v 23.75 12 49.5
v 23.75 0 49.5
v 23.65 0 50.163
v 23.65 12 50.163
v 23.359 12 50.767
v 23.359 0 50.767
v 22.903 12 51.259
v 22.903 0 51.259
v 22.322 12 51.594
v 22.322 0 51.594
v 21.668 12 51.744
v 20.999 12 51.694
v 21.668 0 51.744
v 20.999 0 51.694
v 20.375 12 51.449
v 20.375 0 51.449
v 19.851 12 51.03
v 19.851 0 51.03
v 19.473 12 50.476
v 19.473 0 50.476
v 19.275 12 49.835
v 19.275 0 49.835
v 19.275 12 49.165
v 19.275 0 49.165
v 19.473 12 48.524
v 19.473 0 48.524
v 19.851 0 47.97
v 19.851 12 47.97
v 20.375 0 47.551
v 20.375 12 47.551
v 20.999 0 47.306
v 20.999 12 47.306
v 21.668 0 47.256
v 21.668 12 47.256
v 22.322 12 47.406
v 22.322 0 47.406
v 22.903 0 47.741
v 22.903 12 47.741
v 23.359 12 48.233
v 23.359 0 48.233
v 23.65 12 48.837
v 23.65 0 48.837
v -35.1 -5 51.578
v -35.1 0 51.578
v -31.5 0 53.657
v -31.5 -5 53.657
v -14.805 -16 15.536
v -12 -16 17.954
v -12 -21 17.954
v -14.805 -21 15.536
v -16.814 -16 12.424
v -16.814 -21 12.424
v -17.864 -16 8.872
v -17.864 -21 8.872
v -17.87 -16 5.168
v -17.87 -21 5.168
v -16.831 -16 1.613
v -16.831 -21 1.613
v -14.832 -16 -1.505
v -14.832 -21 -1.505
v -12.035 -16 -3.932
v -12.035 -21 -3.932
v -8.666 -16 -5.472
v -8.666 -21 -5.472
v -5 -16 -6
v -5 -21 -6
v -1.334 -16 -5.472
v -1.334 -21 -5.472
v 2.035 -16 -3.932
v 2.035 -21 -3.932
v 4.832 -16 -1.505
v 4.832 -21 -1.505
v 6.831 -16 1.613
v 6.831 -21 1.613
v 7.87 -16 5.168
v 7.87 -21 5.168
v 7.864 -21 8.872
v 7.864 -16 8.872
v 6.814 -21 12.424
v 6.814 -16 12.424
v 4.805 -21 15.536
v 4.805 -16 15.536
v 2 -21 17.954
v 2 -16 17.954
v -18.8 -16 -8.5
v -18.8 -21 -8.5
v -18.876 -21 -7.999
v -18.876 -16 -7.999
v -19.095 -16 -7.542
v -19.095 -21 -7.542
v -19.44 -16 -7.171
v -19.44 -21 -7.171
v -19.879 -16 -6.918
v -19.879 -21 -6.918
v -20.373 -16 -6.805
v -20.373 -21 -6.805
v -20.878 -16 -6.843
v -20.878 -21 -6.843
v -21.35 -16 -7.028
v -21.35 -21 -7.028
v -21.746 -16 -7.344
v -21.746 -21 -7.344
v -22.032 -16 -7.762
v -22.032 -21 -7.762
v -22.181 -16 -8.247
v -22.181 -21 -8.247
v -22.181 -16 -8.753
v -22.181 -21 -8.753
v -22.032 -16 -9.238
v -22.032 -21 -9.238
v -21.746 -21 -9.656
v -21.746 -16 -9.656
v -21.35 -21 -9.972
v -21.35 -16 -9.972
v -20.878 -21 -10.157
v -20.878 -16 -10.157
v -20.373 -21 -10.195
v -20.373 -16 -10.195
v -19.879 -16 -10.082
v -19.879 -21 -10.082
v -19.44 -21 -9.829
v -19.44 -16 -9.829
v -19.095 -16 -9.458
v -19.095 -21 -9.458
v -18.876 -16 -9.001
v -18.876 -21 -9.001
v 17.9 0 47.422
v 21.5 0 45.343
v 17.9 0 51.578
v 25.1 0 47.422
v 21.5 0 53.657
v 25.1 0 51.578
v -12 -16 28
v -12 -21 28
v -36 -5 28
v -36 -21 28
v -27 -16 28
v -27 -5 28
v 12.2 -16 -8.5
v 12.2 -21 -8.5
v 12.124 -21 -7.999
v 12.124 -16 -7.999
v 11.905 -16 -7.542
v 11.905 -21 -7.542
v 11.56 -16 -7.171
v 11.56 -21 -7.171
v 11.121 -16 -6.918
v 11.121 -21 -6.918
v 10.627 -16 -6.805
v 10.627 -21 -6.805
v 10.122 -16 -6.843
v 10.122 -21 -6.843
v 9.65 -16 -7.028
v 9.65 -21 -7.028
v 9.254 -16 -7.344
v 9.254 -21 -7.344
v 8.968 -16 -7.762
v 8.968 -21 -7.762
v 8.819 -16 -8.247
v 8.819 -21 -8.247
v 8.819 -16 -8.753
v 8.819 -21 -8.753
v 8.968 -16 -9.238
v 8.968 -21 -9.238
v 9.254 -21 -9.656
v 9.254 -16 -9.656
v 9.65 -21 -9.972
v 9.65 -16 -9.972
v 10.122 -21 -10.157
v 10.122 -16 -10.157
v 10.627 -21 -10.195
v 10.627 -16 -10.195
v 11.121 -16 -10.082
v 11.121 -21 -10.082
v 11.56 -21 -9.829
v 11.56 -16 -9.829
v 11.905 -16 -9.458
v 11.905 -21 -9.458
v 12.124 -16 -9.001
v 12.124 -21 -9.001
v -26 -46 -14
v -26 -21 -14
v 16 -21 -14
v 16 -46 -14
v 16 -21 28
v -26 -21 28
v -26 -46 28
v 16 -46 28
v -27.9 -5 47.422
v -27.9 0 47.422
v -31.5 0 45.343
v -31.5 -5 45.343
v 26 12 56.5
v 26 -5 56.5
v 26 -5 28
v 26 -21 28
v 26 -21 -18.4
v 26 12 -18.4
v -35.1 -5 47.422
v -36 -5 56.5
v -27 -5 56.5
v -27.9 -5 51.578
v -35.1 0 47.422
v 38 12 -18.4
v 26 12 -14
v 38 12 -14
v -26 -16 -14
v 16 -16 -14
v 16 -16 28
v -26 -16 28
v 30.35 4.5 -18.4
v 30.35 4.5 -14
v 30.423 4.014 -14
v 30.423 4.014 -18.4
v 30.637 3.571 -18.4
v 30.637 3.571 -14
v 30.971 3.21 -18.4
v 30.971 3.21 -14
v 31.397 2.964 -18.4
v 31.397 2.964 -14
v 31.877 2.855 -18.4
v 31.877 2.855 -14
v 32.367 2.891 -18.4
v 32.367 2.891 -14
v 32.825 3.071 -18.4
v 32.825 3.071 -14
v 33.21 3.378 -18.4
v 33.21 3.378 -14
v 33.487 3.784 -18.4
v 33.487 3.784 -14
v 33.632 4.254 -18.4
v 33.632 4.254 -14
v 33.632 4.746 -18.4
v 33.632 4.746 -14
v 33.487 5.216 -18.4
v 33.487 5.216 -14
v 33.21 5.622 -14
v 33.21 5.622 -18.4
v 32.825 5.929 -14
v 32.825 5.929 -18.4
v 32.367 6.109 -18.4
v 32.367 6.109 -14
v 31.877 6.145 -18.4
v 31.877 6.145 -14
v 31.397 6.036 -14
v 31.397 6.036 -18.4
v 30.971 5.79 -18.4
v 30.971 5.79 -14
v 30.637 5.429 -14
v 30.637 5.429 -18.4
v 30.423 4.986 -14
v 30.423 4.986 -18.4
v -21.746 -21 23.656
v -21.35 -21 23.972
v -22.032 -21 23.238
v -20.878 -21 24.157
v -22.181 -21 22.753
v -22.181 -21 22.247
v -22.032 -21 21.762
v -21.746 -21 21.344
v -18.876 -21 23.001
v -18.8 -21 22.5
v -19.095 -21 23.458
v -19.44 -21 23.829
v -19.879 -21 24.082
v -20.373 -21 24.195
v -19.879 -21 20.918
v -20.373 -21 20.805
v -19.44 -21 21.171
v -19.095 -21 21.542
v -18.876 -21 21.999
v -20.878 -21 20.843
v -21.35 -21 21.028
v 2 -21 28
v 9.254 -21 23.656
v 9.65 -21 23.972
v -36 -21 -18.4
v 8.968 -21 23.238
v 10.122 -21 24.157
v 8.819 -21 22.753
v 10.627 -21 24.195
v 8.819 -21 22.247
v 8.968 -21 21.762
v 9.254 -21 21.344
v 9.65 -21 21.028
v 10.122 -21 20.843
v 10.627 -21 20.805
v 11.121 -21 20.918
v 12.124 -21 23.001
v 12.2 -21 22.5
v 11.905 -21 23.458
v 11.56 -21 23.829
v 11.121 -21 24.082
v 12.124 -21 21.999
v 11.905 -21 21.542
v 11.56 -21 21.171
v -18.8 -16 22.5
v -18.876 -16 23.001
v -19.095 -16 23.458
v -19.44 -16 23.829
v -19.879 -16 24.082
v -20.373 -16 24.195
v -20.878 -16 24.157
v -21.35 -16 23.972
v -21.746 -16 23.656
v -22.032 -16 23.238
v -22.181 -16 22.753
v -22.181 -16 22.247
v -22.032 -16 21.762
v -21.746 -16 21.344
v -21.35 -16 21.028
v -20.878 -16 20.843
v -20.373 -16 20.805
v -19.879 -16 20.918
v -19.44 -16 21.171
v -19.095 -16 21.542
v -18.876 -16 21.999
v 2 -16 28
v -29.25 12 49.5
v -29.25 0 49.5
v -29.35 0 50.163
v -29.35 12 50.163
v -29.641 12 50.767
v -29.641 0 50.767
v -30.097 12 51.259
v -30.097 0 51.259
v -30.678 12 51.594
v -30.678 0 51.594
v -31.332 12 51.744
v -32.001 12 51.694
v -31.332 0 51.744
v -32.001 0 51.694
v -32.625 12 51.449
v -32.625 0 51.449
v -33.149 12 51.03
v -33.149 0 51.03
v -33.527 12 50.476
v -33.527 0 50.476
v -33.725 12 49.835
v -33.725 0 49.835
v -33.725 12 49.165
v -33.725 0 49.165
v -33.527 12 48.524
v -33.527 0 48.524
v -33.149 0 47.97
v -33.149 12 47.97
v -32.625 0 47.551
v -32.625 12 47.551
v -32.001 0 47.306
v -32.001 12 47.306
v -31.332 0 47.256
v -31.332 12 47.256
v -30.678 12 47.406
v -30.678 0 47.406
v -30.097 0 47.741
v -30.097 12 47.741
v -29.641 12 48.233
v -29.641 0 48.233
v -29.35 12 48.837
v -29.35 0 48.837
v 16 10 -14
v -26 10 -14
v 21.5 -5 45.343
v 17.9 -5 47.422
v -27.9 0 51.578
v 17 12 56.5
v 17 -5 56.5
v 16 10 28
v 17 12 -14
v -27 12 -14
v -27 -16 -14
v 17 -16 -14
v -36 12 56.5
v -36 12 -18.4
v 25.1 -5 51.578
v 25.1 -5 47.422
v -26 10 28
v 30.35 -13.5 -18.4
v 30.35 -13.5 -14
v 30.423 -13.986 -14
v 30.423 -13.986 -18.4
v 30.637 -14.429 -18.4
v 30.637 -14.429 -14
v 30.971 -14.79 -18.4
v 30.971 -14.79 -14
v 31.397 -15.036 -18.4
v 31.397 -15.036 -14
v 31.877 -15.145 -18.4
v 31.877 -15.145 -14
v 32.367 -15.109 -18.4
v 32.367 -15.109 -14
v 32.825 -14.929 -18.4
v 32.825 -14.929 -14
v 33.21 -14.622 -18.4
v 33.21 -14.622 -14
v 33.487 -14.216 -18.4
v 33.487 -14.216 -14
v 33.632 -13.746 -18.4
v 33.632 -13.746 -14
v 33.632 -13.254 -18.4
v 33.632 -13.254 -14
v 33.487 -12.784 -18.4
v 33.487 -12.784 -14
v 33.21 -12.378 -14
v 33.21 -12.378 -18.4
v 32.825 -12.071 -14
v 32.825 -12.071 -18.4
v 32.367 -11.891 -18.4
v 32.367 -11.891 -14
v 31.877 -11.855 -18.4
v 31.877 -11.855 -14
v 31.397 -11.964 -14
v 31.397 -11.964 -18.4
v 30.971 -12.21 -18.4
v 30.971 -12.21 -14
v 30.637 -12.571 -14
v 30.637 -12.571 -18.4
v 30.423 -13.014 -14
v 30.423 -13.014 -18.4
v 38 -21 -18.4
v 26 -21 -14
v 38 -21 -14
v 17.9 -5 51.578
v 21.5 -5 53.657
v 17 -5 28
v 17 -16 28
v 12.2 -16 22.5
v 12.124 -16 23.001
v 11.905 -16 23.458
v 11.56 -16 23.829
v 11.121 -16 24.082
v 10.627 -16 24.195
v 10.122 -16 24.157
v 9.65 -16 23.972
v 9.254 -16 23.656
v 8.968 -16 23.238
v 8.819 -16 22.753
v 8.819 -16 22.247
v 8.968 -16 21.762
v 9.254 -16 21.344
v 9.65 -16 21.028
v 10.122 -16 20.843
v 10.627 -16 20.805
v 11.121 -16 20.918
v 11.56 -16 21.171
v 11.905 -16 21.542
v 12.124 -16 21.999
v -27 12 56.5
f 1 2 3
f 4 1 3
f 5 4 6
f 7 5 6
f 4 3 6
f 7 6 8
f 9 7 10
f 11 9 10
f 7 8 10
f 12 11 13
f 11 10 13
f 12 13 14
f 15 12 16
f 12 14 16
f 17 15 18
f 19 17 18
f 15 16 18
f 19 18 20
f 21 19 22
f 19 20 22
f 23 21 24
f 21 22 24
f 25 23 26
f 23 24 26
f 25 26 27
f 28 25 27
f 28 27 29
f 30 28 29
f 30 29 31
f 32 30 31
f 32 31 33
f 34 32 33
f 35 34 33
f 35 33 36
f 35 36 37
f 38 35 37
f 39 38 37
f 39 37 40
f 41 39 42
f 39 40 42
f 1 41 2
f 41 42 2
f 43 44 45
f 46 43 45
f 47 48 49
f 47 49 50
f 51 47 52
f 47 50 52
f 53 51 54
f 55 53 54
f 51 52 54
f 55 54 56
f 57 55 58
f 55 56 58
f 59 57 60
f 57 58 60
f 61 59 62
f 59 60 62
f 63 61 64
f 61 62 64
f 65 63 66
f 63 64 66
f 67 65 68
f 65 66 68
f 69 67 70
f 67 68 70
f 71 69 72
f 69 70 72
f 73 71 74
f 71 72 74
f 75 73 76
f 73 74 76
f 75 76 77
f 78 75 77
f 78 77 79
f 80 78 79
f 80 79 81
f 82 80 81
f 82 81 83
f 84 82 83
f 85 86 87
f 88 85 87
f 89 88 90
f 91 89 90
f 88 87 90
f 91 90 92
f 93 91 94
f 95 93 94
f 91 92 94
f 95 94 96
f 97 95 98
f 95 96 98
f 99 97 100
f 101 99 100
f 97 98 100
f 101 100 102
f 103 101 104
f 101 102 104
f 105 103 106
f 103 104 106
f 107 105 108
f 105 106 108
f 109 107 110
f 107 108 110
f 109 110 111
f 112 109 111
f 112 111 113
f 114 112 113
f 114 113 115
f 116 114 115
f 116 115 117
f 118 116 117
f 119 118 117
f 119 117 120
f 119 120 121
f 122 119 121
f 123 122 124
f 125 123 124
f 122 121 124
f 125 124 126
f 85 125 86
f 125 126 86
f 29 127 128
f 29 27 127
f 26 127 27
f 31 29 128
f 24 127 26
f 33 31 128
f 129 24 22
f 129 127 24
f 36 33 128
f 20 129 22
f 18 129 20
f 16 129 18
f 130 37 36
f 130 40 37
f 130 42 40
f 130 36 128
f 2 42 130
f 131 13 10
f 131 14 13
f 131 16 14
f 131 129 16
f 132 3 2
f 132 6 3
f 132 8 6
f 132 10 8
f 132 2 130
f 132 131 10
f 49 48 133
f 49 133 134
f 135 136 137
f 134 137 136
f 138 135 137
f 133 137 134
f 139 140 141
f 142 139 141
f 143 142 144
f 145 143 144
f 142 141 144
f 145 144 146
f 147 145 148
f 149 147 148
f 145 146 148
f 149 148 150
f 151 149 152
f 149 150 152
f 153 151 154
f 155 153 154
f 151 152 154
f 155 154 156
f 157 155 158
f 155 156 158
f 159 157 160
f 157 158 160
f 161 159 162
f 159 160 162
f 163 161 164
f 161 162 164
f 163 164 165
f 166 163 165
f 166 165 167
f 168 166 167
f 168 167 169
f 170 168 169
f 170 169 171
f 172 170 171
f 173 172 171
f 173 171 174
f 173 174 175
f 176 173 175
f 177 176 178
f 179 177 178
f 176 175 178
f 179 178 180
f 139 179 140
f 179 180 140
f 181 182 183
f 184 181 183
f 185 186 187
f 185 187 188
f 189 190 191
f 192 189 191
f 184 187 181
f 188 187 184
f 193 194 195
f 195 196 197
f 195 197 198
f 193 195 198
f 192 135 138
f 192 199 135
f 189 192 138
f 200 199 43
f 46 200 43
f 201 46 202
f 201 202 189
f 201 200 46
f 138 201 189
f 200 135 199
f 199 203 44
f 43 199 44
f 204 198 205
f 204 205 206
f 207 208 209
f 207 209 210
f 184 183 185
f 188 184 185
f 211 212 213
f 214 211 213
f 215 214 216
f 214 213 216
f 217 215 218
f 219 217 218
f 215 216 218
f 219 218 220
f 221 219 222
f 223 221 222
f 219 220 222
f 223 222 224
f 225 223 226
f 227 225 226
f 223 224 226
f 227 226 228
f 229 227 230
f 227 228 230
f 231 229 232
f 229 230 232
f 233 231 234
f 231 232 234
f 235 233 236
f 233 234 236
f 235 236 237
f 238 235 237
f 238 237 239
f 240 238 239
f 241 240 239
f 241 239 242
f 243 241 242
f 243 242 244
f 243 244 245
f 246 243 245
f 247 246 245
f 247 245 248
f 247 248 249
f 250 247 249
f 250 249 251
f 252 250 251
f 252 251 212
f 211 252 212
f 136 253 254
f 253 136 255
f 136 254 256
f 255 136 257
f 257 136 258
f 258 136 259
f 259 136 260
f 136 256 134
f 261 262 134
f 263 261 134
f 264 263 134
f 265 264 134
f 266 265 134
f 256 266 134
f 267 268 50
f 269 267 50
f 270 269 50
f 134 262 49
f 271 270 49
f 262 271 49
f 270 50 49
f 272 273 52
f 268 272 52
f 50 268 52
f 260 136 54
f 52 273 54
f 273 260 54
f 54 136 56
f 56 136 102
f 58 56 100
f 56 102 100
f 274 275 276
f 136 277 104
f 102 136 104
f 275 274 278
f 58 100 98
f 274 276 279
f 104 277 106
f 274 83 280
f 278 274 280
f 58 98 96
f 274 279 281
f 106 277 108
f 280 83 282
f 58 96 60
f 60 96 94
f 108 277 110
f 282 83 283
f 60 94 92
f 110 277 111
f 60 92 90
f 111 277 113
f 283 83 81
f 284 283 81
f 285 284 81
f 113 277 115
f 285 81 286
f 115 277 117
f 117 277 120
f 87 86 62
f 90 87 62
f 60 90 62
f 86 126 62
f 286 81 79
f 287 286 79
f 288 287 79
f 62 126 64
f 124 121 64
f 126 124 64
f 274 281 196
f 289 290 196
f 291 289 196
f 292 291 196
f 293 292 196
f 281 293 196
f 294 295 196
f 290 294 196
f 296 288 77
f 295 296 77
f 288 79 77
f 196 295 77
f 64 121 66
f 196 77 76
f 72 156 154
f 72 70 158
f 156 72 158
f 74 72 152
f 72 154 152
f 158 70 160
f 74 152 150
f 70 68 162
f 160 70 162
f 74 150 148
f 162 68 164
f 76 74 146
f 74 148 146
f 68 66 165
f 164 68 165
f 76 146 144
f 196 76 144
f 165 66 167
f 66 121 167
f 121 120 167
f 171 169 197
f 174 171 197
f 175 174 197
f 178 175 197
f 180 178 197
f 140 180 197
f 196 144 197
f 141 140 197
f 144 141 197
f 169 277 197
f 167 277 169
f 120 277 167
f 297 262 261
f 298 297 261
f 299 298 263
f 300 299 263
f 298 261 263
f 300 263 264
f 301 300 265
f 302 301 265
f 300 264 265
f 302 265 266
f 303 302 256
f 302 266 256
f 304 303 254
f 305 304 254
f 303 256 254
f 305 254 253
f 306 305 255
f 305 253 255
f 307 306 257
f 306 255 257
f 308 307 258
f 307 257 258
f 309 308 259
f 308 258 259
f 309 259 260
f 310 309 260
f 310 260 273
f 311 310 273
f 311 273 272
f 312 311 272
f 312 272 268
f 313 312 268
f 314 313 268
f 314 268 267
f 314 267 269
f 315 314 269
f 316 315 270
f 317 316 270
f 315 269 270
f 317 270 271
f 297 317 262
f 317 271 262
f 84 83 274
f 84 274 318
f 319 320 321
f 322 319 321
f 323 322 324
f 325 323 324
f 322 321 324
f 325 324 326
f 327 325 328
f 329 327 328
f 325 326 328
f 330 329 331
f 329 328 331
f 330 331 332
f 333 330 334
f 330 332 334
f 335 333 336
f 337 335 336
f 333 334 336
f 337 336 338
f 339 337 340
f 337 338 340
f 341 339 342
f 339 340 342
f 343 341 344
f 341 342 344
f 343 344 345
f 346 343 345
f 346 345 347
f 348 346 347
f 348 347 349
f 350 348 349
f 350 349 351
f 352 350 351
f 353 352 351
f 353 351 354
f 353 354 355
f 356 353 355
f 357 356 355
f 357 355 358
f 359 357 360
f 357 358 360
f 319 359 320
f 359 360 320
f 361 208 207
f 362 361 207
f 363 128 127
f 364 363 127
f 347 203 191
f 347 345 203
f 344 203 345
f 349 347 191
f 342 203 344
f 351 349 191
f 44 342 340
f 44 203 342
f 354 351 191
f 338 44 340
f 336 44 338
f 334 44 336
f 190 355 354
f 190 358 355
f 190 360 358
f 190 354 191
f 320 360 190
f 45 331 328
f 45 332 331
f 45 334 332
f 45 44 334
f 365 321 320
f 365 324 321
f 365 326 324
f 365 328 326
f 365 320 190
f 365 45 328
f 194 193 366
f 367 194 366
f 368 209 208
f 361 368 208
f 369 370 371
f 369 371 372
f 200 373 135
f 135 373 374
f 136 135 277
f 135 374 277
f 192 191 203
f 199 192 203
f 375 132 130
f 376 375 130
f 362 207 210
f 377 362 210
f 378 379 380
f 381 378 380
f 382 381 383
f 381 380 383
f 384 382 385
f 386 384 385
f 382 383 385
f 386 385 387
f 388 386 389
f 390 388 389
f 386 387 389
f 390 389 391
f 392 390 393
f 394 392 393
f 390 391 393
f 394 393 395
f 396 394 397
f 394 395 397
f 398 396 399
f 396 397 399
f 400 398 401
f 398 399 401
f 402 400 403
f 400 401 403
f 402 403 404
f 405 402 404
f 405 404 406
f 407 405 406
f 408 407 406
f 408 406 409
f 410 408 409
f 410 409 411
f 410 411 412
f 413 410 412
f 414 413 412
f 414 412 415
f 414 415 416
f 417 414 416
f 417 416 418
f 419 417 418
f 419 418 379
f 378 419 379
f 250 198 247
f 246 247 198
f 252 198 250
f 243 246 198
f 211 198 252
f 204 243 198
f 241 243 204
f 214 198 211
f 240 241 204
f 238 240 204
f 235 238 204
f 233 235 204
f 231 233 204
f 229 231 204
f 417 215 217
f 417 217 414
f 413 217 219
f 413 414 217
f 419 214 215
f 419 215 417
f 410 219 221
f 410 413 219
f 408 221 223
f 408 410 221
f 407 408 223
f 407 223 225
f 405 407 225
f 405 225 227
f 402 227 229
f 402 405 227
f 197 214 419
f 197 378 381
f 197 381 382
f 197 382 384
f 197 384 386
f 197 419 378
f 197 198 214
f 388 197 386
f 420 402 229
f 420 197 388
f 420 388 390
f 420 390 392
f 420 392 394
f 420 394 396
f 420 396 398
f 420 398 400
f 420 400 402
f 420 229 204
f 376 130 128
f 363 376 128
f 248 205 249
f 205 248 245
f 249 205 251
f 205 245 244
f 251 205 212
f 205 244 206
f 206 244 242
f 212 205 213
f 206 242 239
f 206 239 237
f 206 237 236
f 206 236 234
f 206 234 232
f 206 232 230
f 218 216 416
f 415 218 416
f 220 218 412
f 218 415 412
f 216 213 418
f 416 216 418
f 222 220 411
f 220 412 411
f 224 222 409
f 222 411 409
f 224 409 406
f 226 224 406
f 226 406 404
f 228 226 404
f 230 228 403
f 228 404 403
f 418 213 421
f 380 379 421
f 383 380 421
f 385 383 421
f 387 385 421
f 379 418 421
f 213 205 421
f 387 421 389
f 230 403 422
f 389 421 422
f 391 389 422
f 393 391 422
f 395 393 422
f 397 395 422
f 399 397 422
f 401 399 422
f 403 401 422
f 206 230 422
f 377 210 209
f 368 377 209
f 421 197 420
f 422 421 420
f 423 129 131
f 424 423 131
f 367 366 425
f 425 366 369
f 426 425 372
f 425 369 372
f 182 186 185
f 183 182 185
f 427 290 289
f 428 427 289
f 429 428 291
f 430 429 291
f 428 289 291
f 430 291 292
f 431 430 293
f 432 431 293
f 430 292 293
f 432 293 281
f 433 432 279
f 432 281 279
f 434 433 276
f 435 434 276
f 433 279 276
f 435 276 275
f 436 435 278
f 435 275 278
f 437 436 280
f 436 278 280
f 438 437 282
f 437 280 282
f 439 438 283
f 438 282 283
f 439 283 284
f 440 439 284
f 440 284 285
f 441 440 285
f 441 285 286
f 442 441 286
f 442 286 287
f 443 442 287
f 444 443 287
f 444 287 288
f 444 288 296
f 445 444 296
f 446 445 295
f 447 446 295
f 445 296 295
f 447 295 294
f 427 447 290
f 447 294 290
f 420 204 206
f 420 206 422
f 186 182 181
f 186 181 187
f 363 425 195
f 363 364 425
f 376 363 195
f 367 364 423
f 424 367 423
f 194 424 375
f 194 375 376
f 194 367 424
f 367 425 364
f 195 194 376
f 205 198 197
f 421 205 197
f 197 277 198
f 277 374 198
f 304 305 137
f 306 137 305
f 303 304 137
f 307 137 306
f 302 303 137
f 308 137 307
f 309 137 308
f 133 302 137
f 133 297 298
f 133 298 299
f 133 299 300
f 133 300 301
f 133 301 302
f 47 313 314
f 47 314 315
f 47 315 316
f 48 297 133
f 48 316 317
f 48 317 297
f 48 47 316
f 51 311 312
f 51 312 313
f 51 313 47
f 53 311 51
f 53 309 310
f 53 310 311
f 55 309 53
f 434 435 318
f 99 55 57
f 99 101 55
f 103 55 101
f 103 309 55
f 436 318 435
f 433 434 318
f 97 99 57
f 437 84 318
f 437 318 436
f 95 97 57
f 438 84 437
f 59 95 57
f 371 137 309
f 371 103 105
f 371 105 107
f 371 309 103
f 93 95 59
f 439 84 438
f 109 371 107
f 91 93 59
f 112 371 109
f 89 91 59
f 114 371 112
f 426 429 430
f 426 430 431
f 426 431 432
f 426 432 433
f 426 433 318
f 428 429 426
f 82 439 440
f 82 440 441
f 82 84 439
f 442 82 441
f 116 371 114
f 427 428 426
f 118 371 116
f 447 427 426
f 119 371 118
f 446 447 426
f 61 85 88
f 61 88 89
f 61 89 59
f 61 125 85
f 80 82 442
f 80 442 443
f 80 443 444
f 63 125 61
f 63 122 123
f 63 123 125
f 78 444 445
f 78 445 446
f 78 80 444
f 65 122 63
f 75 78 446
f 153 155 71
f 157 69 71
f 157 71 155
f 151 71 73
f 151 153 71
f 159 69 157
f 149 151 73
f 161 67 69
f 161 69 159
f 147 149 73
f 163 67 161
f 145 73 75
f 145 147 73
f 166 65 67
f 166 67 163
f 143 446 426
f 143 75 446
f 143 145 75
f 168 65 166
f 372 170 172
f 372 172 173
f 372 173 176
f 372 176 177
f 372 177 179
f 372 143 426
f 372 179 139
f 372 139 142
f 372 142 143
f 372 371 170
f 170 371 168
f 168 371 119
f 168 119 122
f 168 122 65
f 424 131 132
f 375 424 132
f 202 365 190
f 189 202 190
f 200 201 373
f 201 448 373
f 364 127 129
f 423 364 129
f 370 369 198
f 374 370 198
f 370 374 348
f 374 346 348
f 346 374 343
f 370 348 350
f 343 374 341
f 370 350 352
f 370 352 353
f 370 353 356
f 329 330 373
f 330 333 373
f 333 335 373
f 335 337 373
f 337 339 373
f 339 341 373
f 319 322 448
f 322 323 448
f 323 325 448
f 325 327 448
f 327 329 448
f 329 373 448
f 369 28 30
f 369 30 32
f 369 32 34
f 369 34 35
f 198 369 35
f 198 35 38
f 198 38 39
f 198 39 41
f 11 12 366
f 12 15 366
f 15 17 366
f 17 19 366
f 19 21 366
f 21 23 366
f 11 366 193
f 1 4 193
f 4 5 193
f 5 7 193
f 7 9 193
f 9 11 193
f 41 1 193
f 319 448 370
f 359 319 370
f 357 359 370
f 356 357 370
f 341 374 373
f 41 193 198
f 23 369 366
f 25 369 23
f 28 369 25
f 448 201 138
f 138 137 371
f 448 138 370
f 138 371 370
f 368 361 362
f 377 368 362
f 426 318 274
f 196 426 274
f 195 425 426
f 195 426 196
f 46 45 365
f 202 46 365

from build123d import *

# Parameters (mm, degrees)
F1_R      = 2.25
F2_DEPTH  = 12
F4_DEPTH  = 5
F5_W      = 44
F5_H      = 11
F5_H_2    = 5
F6_DEPTH  = 7
F7_DEPTH  = 42
F8_R      = 1.7
F8_R_2    = 13
F9_DEPTH  = 5
F11_REACH = 63.8670687473
F12_R     = 1.7
F13_DEPTH = 26
F14_W     = 42
F14_H     = 42
F14_R     = 1.7
F14_R_2   = 13
F15_DEPTH = 25
F19_DEPTH = 2.6
F20_W     = 12
F20_H     = 33
F21_DEPTH = 4.4
F22_D     = 3.3


with BuildPart() as f2:
    # F1 (on Front) → F2 (new body)
    with BuildSketch(Plane.XZ):
        Polygon((-27, 56.5), (-36, 56.5), (-36, -21), (26, -21), (26, 56.5), (17, 56.5), (17, -14), (-27, -14), align=None)
        with Locations((-31.5, 49.5)):
            Circle(F1_R, mode=Mode.SUBTRACT)
        with Locations((21.5, 49.5)):
            Circle(F1_R, mode=Mode.SUBTRACT)
    extrude(amount=-F2_DEPTH)

    # F3 (on face) → F4 (join)
    with BuildSketch(Plane.XZ):
        Polygon((-27, -14), (-27, 56.5), (-36, 56.5), (-36, -21), (26, -21), (26, 56.5), (17, 56.5), (17, -14), align=None)
        Polygon((-31.5, 53.6569219382), (-27.9, 51.5784609691), (-27.9, 47.4215390309), (-31.5, 45.3430780618), (-35.1, 47.4215390309), (-35.1, 51.5784609691), align=None, mode=Mode.SUBTRACT)
        Polygon((21.5, 53.6569219382), (25.1, 51.5784609691), (25.1, 47.4215390309), (21.5, 45.3430780618), (17.9, 47.4215390309), (17.9, 51.5784609691), align=None, mode=Mode.SUBTRACT)
    extrude(amount=F4_DEPTH)

    # F5 (on face) → F6 (join, through all)
    with BuildSketch(Plane.XY.offset(-14)):
        with Locations((-5, -10.5)):
            Rectangle(F5_W, F5_H)
        with Locations((-5, -18.5)):
            Rectangle(F5_W, F5_H_2)
        Polygon((-27, -16), (-27, -5), (-36, -5), (-36, -21), (-27, -21), align=None)
        Polygon((26, -5), (17, -5), (17, -16), (17, -21), (26, -21), align=None)
    extrude(amount=-F6_DEPTH)

    # F5 (on face) → F7 (join)
    with BuildSketch(Plane.XY.offset(-14)):
        with Locations((-5, -18.5)):
            Rectangle(F5_W, F5_H_2)
        Polygon((-27, -16), (-27, -5), (-36, -5), (-36, -21), (-27, -21), align=None)
        Polygon((26, -5), (17, -5), (17, -16), (17, -21), (26, -21), align=None)
    extrude(amount=F7_DEPTH)

    # F8 (on face) → F9 (cut, through all)
    with BuildSketch(Plane.XZ.offset(21)):
        with Locations((-20.5, 22.5)):
            Circle(F8_R)
        with Locations((-5, 7)):
            Circle(F8_R_2)
        with Locations((-20.5, -8.5)):
            Circle(F8_R)
        with Locations((10.5, -8.5)):
            Circle(F8_R)
        with Locations((10.5, 22.5)):
            Circle(F8_R)
    extrude(amount=-F9_DEPTH, mode=Mode.SUBTRACT)

    f11_end = f2.faces().sort_by_distance((-18, -18.5, 7))[0]
    # F10 (on face) → F11 (cut, up to a face of the model that its end follows)
    with BuildSketch(Plane.XY.offset(28)):
        Polygon((2, -16), (-5, -16), (-12, -16), (-12, -21), (2, -21), align=None)
    f11_long = extrude(amount=-F11_REACH, mode=Mode.PRIVATE)
    add(split(f11_long, bisect_by=f11_end, keep=Keep.ALL, mode=Mode.PRIVATE).solids().sort_by_distance((-5, -18.5, 28))[0], mode=Mode.SUBTRACT)

    # F19 (cut, through all): a face of the model
    f19_faces = [f2.faces().sort_by_distance(p)[0] for p in [
        (-5, -4.5, -21),
    ]]
    extrude(f19_faces, amount=-F19_DEPTH, mode=Mode.SUBTRACT)


with BuildPart() as f13:
    # F12 (on face) → F13 (new body)
    with BuildSketch(Plane(origin=(0, -16, 0), x_dir=(-1, 0, 0), z_dir=(0, 1, 0))):
        with BuildLine():
            Line((-16, -14), (26, -14))
            Line((26, -14), (26, 28))
            Line((26, 28), (12, 28))
            Line((12, 28), (12, 17.9544511501))
            ThreePointArc((12, 17.9544511501), (5, -6), (-2, 17.9544511501))
            Line((-2, 17.9544511501), (-2, 28))
            Line((-2, 28), (-16, 28))
            Line((-16, 28), (-16, -14))
        make_face()
        with Locations((-10.5, -8.5)):
            Circle(F12_R, mode=Mode.SUBTRACT)
        with Locations((20.5, -8.5)):
            Circle(F12_R, mode=Mode.SUBTRACT)
        with Locations((-10.5, 22.5)):
            Circle(F12_R, mode=Mode.SUBTRACT)
        with Locations((20.5, 22.5)):
            Circle(F12_R, mode=Mode.SUBTRACT)
        with BuildLine():
            Line((12, 17.9544511501), (12, 28))
            Line((12, 28), (-2, 28))
            Line((-2, 28), (-2, 17.9544511501))
            ThreePointArc((-2, 17.9544511501), (5, -6), (12, 17.9544511501))
        make_face()
        with Locations((-10.5, 22.5)):
            Circle(F12_R)
        with Locations((20.5, 22.5)):
            Circle(F12_R)
        with Locations((-10.5, -8.5)):
            Circle(F12_R)
        with Locations((20.5, -8.5)):
            Circle(F12_R)
    extrude(amount=F13_DEPTH)


with BuildPart() as f15:
    # F14 (on face) → F15 (new body)
    with BuildSketch(Plane.XZ.offset(21)):
        with Locations((-5, 7)):
            Rectangle(F14_W, F14_H)
        with Locations((-20.5, -8.5)):
            Circle(F14_R, mode=Mode.SUBTRACT)
        with Locations((10.5, -8.5)):
            Circle(F14_R, mode=Mode.SUBTRACT)
        with Locations((-20.5, 22.5)):
            Circle(F14_R, mode=Mode.SUBTRACT)
        with Locations((-5, 7)):
            Circle(F14_R_2, mode=Mode.SUBTRACT)
        with Locations((10.5, 22.5)):
            Circle(F14_R, mode=Mode.SUBTRACT)
    extrude(amount=F15_DEPTH)

    # F8 (on face) → F15, piece 2 (join)
    with BuildSketch(Plane.XZ.offset(21)):
        with Locations((-20.5, 22.5)):
            Circle(F8_R)
    extrude(amount=F15_DEPTH)

    # F8 (on face) → F15, piece 3 (join)
    with BuildSketch(Plane.XZ.offset(21)):
        with Locations((-5, 7)):
            Circle(F8_R_2)
    extrude(amount=F15_DEPTH)

    # F8 (on face) → F15, piece 4 (join)
    with BuildSketch(Plane.XZ.offset(21)):
        with Locations((-20.5, -8.5)):
            Circle(F8_R)
    extrude(amount=F15_DEPTH)

    # F8 (on face) → F15, piece 5 (join)
    with BuildSketch(Plane.XZ.offset(21)):
        with Locations((10.5, 22.5)):
            Circle(F8_R)
    extrude(amount=F15_DEPTH)

    # F8 (on face) → F15, piece 6 (join)
    with BuildSketch(Plane.XZ.offset(21)):
        with Locations((10.5, -8.5)):
            Circle(F8_R)
    extrude(amount=F15_DEPTH)


with BuildPart() as f21:
    # F20 (on face) → F21 (new body, through all)
    with BuildSketch(Plane(origin=(0, 0, -18.4), x_dir=(1, 0, 0), z_dir=(0, 0, -1))):
        with Locations((32, 4.5)):
            Rectangle(F20_W, F20_H)
    extrude(amount=-F21_DEPTH)

    # F22 (through all)
    with Locations(Plane(origin=(0, 0, -18.4), x_dir=(1, 0, 0), z_dir=(0, 0, -1))):
        with Locations((32, -4.5), (32, 13.5)):
            Hole(F22_D / 2)


solid = Compound([f2.part, f13.part, f15.part, f21.part])
